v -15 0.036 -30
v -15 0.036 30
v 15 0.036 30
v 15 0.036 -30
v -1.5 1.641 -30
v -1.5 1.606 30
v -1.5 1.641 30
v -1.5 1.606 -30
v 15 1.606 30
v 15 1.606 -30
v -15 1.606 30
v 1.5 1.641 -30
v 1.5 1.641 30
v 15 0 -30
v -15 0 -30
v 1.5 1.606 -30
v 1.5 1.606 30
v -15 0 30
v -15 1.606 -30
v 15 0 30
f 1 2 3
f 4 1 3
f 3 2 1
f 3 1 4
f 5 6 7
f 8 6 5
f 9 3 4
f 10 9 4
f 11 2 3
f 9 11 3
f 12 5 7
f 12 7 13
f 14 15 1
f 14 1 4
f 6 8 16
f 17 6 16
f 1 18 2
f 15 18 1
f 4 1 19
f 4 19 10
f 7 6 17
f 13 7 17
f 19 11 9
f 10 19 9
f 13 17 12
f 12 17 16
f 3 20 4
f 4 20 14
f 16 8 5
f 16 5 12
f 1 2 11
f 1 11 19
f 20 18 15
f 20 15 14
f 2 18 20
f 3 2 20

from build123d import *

# Parameters (mm, degrees)
SKETCH2_W           = 30
SKETCH2_H           = 60
BOSS_EXTRUDE1_DEPTH = 0.03556
SKETCH3_W           = 30
SKETCH3_H           = 60
BOSS_EXTRUDE2_DEPTH = 1.57
SKETCH4_W           = 3
SKETCH4_H           = 60
BOSS_EXTRUDE3_DEPTH = 0.03556


with BuildPart() as part:
    # Sketch2 → Boss-Extrude1 (new body)
    with BuildSketch(Plane(origin=(0, 0, 0), x_dir=(1, 0, 0), z_dir=(0, 1, 0))):
        Rectangle(SKETCH2_W, SKETCH2_H)
    extrude(amount=BOSS_EXTRUDE1_DEPTH)


with BuildPart() as body_2:
    # Sketch3 → Boss-Extrude2 (new body)
    with BuildSketch(Plane(origin=(0, 0.03556, 0), x_dir=(1, 0, 0), z_dir=(0, 1, 0))):
        Rectangle(SKETCH3_W, SKETCH3_H)
    extrude(amount=BOSS_EXTRUDE2_DEPTH)


with BuildPart() as body_3:
    # Sketch4 → Boss-Extrude3 (new body)
    with BuildSketch(Plane(origin=(0, 1.60556, 0), x_dir=(1, 0, 0), z_dir=(0, 1, 0))):
        Rectangle(SKETCH4_W, SKETCH4_H)
    extrude(amount=BOSS_EXTRUDE3_DEPTH)


solid = Compound([part.part, body_2.part, body_3.part])
